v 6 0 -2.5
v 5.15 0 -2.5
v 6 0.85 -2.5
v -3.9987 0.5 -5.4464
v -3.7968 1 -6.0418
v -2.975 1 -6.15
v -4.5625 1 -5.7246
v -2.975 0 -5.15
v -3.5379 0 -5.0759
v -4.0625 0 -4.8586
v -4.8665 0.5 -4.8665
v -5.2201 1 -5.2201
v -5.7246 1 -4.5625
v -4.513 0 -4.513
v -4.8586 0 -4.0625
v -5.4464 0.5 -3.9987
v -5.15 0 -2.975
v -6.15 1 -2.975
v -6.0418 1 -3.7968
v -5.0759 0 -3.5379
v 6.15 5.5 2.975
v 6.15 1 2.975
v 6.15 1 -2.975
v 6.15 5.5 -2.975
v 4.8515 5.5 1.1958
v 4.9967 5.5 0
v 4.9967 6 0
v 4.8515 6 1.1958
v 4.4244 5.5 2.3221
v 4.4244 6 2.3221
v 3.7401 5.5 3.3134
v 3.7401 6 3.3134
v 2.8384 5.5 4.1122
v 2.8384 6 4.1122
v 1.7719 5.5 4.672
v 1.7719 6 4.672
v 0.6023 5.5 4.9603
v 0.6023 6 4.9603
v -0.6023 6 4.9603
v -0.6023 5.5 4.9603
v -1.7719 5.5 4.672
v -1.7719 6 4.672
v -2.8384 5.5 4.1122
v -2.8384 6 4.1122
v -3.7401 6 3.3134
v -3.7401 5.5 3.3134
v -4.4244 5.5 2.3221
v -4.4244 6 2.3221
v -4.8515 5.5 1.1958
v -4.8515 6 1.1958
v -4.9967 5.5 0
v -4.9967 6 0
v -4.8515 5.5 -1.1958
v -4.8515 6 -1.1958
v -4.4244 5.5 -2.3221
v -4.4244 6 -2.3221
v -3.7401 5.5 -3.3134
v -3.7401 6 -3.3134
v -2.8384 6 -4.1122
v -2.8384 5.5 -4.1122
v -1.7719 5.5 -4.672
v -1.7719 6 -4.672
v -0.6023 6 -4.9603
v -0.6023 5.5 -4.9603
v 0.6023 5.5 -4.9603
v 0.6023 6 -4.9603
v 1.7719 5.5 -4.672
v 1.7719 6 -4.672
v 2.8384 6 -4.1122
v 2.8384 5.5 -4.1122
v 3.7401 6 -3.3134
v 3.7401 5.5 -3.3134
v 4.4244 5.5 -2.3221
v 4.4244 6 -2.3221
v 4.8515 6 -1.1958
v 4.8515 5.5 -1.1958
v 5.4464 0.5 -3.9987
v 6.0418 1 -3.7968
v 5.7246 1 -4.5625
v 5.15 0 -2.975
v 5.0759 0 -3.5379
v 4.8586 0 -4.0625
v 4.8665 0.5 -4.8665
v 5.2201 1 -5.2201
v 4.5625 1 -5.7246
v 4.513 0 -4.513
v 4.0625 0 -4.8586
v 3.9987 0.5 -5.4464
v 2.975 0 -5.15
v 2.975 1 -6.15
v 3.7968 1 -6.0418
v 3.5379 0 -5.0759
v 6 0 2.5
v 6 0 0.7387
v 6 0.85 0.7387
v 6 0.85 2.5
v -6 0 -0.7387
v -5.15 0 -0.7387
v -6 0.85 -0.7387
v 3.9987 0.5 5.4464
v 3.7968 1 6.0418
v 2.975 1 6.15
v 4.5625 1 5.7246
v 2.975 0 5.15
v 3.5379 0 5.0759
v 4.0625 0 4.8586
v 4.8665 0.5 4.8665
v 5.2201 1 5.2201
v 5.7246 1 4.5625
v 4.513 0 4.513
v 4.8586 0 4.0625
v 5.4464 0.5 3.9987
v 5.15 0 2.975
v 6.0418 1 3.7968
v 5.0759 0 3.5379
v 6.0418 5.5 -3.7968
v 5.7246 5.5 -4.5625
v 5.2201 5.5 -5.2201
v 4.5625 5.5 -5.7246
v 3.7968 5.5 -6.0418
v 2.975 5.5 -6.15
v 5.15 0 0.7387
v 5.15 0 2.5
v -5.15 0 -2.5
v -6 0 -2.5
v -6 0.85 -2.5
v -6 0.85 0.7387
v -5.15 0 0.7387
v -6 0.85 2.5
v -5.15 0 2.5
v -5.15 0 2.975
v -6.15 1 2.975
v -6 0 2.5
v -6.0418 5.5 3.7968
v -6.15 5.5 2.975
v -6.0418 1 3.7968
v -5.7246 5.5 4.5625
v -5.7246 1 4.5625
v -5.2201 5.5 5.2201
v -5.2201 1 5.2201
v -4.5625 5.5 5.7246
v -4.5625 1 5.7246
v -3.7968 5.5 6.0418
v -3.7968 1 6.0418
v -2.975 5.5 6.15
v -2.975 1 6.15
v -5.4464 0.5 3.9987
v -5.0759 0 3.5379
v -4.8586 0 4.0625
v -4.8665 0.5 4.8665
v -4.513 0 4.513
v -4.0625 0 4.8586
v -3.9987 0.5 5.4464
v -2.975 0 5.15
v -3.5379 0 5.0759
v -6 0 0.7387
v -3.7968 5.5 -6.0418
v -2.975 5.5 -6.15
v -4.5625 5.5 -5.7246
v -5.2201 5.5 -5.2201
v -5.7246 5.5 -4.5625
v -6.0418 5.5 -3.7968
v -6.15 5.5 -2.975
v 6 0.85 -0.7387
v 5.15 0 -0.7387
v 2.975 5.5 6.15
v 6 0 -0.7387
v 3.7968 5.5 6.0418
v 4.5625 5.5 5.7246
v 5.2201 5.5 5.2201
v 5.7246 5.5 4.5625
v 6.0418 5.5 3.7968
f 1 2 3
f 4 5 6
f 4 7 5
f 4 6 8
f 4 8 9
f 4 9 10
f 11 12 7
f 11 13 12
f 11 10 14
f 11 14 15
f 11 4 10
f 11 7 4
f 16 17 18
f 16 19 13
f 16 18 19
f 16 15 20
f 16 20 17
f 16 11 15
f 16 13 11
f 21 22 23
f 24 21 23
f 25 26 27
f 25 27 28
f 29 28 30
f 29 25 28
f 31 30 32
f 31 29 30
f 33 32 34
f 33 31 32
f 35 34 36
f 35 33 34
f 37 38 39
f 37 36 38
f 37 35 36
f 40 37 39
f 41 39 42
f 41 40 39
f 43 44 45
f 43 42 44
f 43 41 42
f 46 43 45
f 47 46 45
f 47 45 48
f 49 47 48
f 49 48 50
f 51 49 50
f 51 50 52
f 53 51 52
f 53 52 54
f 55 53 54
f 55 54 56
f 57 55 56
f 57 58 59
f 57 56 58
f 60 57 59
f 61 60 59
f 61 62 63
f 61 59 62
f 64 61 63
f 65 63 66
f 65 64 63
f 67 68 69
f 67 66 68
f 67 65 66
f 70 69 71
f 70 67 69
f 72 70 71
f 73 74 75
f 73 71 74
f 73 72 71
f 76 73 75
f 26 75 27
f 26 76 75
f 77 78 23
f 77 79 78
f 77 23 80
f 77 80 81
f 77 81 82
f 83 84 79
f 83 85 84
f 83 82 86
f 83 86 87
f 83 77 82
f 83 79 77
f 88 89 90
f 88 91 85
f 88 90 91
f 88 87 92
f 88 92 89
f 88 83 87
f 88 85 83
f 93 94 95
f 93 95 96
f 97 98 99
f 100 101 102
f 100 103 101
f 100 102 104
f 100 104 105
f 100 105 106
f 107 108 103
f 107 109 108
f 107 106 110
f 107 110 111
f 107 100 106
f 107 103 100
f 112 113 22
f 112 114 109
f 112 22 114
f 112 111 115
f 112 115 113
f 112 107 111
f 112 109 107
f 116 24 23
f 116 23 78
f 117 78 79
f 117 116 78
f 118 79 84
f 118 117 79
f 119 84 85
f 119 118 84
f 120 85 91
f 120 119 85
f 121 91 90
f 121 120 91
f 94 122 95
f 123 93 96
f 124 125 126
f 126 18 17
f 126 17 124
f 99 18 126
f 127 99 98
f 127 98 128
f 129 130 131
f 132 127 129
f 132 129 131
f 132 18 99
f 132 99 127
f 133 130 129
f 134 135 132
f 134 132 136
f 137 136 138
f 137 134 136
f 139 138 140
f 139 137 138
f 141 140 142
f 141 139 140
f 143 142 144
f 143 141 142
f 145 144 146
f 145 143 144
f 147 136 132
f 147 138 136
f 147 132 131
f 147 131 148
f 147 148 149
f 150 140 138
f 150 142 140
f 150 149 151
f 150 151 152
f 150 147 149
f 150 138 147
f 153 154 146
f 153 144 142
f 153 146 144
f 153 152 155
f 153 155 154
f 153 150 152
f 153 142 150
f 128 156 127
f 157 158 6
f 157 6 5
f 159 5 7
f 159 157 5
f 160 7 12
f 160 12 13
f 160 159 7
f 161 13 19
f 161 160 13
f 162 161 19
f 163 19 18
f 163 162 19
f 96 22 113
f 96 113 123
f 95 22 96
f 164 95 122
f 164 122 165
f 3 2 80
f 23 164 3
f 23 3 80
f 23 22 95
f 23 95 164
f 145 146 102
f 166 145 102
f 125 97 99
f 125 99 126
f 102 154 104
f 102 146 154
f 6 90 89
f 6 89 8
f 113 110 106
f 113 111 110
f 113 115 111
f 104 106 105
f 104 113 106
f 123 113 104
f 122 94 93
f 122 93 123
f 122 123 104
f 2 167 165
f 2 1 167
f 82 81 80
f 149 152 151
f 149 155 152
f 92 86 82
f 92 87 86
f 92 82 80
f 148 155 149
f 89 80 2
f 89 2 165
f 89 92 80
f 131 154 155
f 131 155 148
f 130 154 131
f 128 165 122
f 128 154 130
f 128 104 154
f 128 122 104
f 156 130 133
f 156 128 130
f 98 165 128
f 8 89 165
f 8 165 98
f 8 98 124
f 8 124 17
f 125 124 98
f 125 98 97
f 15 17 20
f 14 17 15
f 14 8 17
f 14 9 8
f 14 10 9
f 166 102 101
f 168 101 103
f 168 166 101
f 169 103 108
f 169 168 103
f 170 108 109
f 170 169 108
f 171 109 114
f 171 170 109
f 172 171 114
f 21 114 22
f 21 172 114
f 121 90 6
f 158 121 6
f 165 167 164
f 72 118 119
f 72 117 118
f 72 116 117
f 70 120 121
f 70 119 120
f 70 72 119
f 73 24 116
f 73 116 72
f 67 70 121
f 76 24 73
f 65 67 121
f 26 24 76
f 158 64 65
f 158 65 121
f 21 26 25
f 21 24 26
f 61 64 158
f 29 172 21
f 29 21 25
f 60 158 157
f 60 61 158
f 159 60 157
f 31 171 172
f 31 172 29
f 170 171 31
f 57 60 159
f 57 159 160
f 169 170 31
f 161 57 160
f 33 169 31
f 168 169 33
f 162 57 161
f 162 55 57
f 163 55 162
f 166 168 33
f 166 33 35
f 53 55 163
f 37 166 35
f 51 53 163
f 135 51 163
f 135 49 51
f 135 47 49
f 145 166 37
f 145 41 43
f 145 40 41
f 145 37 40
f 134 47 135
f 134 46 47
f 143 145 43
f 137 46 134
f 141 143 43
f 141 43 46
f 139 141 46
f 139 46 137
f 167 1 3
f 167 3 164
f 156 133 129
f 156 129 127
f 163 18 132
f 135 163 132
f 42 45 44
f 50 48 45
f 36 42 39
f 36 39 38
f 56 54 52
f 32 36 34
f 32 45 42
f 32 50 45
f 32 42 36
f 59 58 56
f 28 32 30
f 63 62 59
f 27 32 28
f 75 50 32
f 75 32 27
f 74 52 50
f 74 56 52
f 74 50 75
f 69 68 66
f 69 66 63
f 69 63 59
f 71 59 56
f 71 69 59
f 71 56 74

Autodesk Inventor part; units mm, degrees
ref_plane "YZ Plane" through (0, 0, 0) normal (1, 0, 0) x (0, 1, 0)
ref_plane "XZ Plane" through (0, 0, 0) normal (0, 1, 0) x (-1, 0, 0)
ref_plane "XY Plane" through (0, 0, 0) normal (0, 0, 1) x (1, 0, 0)
sketch "Sketch1" plane through (0, 0, 0) normal (0, 1, 0) x (-1, 0, 0)
  line L0 (6.15, 6.15) -> (-6.15, 6.15)
  line L1 (-6.15, 6.15) -> (-6.15, -6.15)
  line L2 (-6.15, -6.15) -> (6.15, -6.15)
  line L3 (6.15, -6.15) -> (6.15, 6.15)
  point P0 (0, 0)
  dimension "d0" = 12.3
  dimension "d1" = 12.3
  dimension "d2" = 6.15
  dimension "d3" = 6.15
extrude "Extrusion1" add sketch "Sketch1" along normal blind 5.5
fillet "Fillet1" radius 3.175 4 edges at (6.15, 2.75, 6.15) (-6.15, 2.75, 6.15) (6.15, 2.75, -6.15) (-6.15, 2.75, -6.15)
sketch "Sketch2" plane through (0, 5.5, 0) normal (0, 1, 0) x (1, 0, 0)
  circle A0 centre (0, 0) radius 4.9967
extrude "Extrusion2" add sketch "Sketch2" along normal blind 0.5
chamfer "Chamfer1" distance 1 angle 45 8 edges at (0, 0, 6.15) (5.2201, 0, 5.2201) (6.15, 0, 0) (5.2201, 0, -5.2201) (0, 0, -6.15) (-5.2201, 0, -5.2201) (-6.15, 0, 0) (-5.2201, 0, 5.2201)
sketch "Sketch3" plane through (0, 0, 0) normal (0, -1, 0) x (1, 0, 0)
  line L0 (-6, -2.5) -> (-3.8, -2.5)
  line L1 (-3.8, -2.5) -> (-3.8, -0.7387)
  line L2 (-3.8, -0.7387) -> (-6, -0.7387)
  line L3 (-6, -0.7387) -> (-6, -2.5)
  point P0 (0, 0)
  dimension "d12" = 2.5
  dimension "d13" = 3.8
  dimension "d16" = 6
extrude "Extrusion3" add sketch "Sketch3" against normal blind 1
mirror "Mirror1" about plane through (0, 0, 0) normal (0, 0, 1) of "Extrusion3"
mirror "Mirror2" about plane through (0, 0, 0) normal (1, 0, 0) of "Extrusion3", "Mirror1"
properties part number "Inductor_SMD_12mm"
